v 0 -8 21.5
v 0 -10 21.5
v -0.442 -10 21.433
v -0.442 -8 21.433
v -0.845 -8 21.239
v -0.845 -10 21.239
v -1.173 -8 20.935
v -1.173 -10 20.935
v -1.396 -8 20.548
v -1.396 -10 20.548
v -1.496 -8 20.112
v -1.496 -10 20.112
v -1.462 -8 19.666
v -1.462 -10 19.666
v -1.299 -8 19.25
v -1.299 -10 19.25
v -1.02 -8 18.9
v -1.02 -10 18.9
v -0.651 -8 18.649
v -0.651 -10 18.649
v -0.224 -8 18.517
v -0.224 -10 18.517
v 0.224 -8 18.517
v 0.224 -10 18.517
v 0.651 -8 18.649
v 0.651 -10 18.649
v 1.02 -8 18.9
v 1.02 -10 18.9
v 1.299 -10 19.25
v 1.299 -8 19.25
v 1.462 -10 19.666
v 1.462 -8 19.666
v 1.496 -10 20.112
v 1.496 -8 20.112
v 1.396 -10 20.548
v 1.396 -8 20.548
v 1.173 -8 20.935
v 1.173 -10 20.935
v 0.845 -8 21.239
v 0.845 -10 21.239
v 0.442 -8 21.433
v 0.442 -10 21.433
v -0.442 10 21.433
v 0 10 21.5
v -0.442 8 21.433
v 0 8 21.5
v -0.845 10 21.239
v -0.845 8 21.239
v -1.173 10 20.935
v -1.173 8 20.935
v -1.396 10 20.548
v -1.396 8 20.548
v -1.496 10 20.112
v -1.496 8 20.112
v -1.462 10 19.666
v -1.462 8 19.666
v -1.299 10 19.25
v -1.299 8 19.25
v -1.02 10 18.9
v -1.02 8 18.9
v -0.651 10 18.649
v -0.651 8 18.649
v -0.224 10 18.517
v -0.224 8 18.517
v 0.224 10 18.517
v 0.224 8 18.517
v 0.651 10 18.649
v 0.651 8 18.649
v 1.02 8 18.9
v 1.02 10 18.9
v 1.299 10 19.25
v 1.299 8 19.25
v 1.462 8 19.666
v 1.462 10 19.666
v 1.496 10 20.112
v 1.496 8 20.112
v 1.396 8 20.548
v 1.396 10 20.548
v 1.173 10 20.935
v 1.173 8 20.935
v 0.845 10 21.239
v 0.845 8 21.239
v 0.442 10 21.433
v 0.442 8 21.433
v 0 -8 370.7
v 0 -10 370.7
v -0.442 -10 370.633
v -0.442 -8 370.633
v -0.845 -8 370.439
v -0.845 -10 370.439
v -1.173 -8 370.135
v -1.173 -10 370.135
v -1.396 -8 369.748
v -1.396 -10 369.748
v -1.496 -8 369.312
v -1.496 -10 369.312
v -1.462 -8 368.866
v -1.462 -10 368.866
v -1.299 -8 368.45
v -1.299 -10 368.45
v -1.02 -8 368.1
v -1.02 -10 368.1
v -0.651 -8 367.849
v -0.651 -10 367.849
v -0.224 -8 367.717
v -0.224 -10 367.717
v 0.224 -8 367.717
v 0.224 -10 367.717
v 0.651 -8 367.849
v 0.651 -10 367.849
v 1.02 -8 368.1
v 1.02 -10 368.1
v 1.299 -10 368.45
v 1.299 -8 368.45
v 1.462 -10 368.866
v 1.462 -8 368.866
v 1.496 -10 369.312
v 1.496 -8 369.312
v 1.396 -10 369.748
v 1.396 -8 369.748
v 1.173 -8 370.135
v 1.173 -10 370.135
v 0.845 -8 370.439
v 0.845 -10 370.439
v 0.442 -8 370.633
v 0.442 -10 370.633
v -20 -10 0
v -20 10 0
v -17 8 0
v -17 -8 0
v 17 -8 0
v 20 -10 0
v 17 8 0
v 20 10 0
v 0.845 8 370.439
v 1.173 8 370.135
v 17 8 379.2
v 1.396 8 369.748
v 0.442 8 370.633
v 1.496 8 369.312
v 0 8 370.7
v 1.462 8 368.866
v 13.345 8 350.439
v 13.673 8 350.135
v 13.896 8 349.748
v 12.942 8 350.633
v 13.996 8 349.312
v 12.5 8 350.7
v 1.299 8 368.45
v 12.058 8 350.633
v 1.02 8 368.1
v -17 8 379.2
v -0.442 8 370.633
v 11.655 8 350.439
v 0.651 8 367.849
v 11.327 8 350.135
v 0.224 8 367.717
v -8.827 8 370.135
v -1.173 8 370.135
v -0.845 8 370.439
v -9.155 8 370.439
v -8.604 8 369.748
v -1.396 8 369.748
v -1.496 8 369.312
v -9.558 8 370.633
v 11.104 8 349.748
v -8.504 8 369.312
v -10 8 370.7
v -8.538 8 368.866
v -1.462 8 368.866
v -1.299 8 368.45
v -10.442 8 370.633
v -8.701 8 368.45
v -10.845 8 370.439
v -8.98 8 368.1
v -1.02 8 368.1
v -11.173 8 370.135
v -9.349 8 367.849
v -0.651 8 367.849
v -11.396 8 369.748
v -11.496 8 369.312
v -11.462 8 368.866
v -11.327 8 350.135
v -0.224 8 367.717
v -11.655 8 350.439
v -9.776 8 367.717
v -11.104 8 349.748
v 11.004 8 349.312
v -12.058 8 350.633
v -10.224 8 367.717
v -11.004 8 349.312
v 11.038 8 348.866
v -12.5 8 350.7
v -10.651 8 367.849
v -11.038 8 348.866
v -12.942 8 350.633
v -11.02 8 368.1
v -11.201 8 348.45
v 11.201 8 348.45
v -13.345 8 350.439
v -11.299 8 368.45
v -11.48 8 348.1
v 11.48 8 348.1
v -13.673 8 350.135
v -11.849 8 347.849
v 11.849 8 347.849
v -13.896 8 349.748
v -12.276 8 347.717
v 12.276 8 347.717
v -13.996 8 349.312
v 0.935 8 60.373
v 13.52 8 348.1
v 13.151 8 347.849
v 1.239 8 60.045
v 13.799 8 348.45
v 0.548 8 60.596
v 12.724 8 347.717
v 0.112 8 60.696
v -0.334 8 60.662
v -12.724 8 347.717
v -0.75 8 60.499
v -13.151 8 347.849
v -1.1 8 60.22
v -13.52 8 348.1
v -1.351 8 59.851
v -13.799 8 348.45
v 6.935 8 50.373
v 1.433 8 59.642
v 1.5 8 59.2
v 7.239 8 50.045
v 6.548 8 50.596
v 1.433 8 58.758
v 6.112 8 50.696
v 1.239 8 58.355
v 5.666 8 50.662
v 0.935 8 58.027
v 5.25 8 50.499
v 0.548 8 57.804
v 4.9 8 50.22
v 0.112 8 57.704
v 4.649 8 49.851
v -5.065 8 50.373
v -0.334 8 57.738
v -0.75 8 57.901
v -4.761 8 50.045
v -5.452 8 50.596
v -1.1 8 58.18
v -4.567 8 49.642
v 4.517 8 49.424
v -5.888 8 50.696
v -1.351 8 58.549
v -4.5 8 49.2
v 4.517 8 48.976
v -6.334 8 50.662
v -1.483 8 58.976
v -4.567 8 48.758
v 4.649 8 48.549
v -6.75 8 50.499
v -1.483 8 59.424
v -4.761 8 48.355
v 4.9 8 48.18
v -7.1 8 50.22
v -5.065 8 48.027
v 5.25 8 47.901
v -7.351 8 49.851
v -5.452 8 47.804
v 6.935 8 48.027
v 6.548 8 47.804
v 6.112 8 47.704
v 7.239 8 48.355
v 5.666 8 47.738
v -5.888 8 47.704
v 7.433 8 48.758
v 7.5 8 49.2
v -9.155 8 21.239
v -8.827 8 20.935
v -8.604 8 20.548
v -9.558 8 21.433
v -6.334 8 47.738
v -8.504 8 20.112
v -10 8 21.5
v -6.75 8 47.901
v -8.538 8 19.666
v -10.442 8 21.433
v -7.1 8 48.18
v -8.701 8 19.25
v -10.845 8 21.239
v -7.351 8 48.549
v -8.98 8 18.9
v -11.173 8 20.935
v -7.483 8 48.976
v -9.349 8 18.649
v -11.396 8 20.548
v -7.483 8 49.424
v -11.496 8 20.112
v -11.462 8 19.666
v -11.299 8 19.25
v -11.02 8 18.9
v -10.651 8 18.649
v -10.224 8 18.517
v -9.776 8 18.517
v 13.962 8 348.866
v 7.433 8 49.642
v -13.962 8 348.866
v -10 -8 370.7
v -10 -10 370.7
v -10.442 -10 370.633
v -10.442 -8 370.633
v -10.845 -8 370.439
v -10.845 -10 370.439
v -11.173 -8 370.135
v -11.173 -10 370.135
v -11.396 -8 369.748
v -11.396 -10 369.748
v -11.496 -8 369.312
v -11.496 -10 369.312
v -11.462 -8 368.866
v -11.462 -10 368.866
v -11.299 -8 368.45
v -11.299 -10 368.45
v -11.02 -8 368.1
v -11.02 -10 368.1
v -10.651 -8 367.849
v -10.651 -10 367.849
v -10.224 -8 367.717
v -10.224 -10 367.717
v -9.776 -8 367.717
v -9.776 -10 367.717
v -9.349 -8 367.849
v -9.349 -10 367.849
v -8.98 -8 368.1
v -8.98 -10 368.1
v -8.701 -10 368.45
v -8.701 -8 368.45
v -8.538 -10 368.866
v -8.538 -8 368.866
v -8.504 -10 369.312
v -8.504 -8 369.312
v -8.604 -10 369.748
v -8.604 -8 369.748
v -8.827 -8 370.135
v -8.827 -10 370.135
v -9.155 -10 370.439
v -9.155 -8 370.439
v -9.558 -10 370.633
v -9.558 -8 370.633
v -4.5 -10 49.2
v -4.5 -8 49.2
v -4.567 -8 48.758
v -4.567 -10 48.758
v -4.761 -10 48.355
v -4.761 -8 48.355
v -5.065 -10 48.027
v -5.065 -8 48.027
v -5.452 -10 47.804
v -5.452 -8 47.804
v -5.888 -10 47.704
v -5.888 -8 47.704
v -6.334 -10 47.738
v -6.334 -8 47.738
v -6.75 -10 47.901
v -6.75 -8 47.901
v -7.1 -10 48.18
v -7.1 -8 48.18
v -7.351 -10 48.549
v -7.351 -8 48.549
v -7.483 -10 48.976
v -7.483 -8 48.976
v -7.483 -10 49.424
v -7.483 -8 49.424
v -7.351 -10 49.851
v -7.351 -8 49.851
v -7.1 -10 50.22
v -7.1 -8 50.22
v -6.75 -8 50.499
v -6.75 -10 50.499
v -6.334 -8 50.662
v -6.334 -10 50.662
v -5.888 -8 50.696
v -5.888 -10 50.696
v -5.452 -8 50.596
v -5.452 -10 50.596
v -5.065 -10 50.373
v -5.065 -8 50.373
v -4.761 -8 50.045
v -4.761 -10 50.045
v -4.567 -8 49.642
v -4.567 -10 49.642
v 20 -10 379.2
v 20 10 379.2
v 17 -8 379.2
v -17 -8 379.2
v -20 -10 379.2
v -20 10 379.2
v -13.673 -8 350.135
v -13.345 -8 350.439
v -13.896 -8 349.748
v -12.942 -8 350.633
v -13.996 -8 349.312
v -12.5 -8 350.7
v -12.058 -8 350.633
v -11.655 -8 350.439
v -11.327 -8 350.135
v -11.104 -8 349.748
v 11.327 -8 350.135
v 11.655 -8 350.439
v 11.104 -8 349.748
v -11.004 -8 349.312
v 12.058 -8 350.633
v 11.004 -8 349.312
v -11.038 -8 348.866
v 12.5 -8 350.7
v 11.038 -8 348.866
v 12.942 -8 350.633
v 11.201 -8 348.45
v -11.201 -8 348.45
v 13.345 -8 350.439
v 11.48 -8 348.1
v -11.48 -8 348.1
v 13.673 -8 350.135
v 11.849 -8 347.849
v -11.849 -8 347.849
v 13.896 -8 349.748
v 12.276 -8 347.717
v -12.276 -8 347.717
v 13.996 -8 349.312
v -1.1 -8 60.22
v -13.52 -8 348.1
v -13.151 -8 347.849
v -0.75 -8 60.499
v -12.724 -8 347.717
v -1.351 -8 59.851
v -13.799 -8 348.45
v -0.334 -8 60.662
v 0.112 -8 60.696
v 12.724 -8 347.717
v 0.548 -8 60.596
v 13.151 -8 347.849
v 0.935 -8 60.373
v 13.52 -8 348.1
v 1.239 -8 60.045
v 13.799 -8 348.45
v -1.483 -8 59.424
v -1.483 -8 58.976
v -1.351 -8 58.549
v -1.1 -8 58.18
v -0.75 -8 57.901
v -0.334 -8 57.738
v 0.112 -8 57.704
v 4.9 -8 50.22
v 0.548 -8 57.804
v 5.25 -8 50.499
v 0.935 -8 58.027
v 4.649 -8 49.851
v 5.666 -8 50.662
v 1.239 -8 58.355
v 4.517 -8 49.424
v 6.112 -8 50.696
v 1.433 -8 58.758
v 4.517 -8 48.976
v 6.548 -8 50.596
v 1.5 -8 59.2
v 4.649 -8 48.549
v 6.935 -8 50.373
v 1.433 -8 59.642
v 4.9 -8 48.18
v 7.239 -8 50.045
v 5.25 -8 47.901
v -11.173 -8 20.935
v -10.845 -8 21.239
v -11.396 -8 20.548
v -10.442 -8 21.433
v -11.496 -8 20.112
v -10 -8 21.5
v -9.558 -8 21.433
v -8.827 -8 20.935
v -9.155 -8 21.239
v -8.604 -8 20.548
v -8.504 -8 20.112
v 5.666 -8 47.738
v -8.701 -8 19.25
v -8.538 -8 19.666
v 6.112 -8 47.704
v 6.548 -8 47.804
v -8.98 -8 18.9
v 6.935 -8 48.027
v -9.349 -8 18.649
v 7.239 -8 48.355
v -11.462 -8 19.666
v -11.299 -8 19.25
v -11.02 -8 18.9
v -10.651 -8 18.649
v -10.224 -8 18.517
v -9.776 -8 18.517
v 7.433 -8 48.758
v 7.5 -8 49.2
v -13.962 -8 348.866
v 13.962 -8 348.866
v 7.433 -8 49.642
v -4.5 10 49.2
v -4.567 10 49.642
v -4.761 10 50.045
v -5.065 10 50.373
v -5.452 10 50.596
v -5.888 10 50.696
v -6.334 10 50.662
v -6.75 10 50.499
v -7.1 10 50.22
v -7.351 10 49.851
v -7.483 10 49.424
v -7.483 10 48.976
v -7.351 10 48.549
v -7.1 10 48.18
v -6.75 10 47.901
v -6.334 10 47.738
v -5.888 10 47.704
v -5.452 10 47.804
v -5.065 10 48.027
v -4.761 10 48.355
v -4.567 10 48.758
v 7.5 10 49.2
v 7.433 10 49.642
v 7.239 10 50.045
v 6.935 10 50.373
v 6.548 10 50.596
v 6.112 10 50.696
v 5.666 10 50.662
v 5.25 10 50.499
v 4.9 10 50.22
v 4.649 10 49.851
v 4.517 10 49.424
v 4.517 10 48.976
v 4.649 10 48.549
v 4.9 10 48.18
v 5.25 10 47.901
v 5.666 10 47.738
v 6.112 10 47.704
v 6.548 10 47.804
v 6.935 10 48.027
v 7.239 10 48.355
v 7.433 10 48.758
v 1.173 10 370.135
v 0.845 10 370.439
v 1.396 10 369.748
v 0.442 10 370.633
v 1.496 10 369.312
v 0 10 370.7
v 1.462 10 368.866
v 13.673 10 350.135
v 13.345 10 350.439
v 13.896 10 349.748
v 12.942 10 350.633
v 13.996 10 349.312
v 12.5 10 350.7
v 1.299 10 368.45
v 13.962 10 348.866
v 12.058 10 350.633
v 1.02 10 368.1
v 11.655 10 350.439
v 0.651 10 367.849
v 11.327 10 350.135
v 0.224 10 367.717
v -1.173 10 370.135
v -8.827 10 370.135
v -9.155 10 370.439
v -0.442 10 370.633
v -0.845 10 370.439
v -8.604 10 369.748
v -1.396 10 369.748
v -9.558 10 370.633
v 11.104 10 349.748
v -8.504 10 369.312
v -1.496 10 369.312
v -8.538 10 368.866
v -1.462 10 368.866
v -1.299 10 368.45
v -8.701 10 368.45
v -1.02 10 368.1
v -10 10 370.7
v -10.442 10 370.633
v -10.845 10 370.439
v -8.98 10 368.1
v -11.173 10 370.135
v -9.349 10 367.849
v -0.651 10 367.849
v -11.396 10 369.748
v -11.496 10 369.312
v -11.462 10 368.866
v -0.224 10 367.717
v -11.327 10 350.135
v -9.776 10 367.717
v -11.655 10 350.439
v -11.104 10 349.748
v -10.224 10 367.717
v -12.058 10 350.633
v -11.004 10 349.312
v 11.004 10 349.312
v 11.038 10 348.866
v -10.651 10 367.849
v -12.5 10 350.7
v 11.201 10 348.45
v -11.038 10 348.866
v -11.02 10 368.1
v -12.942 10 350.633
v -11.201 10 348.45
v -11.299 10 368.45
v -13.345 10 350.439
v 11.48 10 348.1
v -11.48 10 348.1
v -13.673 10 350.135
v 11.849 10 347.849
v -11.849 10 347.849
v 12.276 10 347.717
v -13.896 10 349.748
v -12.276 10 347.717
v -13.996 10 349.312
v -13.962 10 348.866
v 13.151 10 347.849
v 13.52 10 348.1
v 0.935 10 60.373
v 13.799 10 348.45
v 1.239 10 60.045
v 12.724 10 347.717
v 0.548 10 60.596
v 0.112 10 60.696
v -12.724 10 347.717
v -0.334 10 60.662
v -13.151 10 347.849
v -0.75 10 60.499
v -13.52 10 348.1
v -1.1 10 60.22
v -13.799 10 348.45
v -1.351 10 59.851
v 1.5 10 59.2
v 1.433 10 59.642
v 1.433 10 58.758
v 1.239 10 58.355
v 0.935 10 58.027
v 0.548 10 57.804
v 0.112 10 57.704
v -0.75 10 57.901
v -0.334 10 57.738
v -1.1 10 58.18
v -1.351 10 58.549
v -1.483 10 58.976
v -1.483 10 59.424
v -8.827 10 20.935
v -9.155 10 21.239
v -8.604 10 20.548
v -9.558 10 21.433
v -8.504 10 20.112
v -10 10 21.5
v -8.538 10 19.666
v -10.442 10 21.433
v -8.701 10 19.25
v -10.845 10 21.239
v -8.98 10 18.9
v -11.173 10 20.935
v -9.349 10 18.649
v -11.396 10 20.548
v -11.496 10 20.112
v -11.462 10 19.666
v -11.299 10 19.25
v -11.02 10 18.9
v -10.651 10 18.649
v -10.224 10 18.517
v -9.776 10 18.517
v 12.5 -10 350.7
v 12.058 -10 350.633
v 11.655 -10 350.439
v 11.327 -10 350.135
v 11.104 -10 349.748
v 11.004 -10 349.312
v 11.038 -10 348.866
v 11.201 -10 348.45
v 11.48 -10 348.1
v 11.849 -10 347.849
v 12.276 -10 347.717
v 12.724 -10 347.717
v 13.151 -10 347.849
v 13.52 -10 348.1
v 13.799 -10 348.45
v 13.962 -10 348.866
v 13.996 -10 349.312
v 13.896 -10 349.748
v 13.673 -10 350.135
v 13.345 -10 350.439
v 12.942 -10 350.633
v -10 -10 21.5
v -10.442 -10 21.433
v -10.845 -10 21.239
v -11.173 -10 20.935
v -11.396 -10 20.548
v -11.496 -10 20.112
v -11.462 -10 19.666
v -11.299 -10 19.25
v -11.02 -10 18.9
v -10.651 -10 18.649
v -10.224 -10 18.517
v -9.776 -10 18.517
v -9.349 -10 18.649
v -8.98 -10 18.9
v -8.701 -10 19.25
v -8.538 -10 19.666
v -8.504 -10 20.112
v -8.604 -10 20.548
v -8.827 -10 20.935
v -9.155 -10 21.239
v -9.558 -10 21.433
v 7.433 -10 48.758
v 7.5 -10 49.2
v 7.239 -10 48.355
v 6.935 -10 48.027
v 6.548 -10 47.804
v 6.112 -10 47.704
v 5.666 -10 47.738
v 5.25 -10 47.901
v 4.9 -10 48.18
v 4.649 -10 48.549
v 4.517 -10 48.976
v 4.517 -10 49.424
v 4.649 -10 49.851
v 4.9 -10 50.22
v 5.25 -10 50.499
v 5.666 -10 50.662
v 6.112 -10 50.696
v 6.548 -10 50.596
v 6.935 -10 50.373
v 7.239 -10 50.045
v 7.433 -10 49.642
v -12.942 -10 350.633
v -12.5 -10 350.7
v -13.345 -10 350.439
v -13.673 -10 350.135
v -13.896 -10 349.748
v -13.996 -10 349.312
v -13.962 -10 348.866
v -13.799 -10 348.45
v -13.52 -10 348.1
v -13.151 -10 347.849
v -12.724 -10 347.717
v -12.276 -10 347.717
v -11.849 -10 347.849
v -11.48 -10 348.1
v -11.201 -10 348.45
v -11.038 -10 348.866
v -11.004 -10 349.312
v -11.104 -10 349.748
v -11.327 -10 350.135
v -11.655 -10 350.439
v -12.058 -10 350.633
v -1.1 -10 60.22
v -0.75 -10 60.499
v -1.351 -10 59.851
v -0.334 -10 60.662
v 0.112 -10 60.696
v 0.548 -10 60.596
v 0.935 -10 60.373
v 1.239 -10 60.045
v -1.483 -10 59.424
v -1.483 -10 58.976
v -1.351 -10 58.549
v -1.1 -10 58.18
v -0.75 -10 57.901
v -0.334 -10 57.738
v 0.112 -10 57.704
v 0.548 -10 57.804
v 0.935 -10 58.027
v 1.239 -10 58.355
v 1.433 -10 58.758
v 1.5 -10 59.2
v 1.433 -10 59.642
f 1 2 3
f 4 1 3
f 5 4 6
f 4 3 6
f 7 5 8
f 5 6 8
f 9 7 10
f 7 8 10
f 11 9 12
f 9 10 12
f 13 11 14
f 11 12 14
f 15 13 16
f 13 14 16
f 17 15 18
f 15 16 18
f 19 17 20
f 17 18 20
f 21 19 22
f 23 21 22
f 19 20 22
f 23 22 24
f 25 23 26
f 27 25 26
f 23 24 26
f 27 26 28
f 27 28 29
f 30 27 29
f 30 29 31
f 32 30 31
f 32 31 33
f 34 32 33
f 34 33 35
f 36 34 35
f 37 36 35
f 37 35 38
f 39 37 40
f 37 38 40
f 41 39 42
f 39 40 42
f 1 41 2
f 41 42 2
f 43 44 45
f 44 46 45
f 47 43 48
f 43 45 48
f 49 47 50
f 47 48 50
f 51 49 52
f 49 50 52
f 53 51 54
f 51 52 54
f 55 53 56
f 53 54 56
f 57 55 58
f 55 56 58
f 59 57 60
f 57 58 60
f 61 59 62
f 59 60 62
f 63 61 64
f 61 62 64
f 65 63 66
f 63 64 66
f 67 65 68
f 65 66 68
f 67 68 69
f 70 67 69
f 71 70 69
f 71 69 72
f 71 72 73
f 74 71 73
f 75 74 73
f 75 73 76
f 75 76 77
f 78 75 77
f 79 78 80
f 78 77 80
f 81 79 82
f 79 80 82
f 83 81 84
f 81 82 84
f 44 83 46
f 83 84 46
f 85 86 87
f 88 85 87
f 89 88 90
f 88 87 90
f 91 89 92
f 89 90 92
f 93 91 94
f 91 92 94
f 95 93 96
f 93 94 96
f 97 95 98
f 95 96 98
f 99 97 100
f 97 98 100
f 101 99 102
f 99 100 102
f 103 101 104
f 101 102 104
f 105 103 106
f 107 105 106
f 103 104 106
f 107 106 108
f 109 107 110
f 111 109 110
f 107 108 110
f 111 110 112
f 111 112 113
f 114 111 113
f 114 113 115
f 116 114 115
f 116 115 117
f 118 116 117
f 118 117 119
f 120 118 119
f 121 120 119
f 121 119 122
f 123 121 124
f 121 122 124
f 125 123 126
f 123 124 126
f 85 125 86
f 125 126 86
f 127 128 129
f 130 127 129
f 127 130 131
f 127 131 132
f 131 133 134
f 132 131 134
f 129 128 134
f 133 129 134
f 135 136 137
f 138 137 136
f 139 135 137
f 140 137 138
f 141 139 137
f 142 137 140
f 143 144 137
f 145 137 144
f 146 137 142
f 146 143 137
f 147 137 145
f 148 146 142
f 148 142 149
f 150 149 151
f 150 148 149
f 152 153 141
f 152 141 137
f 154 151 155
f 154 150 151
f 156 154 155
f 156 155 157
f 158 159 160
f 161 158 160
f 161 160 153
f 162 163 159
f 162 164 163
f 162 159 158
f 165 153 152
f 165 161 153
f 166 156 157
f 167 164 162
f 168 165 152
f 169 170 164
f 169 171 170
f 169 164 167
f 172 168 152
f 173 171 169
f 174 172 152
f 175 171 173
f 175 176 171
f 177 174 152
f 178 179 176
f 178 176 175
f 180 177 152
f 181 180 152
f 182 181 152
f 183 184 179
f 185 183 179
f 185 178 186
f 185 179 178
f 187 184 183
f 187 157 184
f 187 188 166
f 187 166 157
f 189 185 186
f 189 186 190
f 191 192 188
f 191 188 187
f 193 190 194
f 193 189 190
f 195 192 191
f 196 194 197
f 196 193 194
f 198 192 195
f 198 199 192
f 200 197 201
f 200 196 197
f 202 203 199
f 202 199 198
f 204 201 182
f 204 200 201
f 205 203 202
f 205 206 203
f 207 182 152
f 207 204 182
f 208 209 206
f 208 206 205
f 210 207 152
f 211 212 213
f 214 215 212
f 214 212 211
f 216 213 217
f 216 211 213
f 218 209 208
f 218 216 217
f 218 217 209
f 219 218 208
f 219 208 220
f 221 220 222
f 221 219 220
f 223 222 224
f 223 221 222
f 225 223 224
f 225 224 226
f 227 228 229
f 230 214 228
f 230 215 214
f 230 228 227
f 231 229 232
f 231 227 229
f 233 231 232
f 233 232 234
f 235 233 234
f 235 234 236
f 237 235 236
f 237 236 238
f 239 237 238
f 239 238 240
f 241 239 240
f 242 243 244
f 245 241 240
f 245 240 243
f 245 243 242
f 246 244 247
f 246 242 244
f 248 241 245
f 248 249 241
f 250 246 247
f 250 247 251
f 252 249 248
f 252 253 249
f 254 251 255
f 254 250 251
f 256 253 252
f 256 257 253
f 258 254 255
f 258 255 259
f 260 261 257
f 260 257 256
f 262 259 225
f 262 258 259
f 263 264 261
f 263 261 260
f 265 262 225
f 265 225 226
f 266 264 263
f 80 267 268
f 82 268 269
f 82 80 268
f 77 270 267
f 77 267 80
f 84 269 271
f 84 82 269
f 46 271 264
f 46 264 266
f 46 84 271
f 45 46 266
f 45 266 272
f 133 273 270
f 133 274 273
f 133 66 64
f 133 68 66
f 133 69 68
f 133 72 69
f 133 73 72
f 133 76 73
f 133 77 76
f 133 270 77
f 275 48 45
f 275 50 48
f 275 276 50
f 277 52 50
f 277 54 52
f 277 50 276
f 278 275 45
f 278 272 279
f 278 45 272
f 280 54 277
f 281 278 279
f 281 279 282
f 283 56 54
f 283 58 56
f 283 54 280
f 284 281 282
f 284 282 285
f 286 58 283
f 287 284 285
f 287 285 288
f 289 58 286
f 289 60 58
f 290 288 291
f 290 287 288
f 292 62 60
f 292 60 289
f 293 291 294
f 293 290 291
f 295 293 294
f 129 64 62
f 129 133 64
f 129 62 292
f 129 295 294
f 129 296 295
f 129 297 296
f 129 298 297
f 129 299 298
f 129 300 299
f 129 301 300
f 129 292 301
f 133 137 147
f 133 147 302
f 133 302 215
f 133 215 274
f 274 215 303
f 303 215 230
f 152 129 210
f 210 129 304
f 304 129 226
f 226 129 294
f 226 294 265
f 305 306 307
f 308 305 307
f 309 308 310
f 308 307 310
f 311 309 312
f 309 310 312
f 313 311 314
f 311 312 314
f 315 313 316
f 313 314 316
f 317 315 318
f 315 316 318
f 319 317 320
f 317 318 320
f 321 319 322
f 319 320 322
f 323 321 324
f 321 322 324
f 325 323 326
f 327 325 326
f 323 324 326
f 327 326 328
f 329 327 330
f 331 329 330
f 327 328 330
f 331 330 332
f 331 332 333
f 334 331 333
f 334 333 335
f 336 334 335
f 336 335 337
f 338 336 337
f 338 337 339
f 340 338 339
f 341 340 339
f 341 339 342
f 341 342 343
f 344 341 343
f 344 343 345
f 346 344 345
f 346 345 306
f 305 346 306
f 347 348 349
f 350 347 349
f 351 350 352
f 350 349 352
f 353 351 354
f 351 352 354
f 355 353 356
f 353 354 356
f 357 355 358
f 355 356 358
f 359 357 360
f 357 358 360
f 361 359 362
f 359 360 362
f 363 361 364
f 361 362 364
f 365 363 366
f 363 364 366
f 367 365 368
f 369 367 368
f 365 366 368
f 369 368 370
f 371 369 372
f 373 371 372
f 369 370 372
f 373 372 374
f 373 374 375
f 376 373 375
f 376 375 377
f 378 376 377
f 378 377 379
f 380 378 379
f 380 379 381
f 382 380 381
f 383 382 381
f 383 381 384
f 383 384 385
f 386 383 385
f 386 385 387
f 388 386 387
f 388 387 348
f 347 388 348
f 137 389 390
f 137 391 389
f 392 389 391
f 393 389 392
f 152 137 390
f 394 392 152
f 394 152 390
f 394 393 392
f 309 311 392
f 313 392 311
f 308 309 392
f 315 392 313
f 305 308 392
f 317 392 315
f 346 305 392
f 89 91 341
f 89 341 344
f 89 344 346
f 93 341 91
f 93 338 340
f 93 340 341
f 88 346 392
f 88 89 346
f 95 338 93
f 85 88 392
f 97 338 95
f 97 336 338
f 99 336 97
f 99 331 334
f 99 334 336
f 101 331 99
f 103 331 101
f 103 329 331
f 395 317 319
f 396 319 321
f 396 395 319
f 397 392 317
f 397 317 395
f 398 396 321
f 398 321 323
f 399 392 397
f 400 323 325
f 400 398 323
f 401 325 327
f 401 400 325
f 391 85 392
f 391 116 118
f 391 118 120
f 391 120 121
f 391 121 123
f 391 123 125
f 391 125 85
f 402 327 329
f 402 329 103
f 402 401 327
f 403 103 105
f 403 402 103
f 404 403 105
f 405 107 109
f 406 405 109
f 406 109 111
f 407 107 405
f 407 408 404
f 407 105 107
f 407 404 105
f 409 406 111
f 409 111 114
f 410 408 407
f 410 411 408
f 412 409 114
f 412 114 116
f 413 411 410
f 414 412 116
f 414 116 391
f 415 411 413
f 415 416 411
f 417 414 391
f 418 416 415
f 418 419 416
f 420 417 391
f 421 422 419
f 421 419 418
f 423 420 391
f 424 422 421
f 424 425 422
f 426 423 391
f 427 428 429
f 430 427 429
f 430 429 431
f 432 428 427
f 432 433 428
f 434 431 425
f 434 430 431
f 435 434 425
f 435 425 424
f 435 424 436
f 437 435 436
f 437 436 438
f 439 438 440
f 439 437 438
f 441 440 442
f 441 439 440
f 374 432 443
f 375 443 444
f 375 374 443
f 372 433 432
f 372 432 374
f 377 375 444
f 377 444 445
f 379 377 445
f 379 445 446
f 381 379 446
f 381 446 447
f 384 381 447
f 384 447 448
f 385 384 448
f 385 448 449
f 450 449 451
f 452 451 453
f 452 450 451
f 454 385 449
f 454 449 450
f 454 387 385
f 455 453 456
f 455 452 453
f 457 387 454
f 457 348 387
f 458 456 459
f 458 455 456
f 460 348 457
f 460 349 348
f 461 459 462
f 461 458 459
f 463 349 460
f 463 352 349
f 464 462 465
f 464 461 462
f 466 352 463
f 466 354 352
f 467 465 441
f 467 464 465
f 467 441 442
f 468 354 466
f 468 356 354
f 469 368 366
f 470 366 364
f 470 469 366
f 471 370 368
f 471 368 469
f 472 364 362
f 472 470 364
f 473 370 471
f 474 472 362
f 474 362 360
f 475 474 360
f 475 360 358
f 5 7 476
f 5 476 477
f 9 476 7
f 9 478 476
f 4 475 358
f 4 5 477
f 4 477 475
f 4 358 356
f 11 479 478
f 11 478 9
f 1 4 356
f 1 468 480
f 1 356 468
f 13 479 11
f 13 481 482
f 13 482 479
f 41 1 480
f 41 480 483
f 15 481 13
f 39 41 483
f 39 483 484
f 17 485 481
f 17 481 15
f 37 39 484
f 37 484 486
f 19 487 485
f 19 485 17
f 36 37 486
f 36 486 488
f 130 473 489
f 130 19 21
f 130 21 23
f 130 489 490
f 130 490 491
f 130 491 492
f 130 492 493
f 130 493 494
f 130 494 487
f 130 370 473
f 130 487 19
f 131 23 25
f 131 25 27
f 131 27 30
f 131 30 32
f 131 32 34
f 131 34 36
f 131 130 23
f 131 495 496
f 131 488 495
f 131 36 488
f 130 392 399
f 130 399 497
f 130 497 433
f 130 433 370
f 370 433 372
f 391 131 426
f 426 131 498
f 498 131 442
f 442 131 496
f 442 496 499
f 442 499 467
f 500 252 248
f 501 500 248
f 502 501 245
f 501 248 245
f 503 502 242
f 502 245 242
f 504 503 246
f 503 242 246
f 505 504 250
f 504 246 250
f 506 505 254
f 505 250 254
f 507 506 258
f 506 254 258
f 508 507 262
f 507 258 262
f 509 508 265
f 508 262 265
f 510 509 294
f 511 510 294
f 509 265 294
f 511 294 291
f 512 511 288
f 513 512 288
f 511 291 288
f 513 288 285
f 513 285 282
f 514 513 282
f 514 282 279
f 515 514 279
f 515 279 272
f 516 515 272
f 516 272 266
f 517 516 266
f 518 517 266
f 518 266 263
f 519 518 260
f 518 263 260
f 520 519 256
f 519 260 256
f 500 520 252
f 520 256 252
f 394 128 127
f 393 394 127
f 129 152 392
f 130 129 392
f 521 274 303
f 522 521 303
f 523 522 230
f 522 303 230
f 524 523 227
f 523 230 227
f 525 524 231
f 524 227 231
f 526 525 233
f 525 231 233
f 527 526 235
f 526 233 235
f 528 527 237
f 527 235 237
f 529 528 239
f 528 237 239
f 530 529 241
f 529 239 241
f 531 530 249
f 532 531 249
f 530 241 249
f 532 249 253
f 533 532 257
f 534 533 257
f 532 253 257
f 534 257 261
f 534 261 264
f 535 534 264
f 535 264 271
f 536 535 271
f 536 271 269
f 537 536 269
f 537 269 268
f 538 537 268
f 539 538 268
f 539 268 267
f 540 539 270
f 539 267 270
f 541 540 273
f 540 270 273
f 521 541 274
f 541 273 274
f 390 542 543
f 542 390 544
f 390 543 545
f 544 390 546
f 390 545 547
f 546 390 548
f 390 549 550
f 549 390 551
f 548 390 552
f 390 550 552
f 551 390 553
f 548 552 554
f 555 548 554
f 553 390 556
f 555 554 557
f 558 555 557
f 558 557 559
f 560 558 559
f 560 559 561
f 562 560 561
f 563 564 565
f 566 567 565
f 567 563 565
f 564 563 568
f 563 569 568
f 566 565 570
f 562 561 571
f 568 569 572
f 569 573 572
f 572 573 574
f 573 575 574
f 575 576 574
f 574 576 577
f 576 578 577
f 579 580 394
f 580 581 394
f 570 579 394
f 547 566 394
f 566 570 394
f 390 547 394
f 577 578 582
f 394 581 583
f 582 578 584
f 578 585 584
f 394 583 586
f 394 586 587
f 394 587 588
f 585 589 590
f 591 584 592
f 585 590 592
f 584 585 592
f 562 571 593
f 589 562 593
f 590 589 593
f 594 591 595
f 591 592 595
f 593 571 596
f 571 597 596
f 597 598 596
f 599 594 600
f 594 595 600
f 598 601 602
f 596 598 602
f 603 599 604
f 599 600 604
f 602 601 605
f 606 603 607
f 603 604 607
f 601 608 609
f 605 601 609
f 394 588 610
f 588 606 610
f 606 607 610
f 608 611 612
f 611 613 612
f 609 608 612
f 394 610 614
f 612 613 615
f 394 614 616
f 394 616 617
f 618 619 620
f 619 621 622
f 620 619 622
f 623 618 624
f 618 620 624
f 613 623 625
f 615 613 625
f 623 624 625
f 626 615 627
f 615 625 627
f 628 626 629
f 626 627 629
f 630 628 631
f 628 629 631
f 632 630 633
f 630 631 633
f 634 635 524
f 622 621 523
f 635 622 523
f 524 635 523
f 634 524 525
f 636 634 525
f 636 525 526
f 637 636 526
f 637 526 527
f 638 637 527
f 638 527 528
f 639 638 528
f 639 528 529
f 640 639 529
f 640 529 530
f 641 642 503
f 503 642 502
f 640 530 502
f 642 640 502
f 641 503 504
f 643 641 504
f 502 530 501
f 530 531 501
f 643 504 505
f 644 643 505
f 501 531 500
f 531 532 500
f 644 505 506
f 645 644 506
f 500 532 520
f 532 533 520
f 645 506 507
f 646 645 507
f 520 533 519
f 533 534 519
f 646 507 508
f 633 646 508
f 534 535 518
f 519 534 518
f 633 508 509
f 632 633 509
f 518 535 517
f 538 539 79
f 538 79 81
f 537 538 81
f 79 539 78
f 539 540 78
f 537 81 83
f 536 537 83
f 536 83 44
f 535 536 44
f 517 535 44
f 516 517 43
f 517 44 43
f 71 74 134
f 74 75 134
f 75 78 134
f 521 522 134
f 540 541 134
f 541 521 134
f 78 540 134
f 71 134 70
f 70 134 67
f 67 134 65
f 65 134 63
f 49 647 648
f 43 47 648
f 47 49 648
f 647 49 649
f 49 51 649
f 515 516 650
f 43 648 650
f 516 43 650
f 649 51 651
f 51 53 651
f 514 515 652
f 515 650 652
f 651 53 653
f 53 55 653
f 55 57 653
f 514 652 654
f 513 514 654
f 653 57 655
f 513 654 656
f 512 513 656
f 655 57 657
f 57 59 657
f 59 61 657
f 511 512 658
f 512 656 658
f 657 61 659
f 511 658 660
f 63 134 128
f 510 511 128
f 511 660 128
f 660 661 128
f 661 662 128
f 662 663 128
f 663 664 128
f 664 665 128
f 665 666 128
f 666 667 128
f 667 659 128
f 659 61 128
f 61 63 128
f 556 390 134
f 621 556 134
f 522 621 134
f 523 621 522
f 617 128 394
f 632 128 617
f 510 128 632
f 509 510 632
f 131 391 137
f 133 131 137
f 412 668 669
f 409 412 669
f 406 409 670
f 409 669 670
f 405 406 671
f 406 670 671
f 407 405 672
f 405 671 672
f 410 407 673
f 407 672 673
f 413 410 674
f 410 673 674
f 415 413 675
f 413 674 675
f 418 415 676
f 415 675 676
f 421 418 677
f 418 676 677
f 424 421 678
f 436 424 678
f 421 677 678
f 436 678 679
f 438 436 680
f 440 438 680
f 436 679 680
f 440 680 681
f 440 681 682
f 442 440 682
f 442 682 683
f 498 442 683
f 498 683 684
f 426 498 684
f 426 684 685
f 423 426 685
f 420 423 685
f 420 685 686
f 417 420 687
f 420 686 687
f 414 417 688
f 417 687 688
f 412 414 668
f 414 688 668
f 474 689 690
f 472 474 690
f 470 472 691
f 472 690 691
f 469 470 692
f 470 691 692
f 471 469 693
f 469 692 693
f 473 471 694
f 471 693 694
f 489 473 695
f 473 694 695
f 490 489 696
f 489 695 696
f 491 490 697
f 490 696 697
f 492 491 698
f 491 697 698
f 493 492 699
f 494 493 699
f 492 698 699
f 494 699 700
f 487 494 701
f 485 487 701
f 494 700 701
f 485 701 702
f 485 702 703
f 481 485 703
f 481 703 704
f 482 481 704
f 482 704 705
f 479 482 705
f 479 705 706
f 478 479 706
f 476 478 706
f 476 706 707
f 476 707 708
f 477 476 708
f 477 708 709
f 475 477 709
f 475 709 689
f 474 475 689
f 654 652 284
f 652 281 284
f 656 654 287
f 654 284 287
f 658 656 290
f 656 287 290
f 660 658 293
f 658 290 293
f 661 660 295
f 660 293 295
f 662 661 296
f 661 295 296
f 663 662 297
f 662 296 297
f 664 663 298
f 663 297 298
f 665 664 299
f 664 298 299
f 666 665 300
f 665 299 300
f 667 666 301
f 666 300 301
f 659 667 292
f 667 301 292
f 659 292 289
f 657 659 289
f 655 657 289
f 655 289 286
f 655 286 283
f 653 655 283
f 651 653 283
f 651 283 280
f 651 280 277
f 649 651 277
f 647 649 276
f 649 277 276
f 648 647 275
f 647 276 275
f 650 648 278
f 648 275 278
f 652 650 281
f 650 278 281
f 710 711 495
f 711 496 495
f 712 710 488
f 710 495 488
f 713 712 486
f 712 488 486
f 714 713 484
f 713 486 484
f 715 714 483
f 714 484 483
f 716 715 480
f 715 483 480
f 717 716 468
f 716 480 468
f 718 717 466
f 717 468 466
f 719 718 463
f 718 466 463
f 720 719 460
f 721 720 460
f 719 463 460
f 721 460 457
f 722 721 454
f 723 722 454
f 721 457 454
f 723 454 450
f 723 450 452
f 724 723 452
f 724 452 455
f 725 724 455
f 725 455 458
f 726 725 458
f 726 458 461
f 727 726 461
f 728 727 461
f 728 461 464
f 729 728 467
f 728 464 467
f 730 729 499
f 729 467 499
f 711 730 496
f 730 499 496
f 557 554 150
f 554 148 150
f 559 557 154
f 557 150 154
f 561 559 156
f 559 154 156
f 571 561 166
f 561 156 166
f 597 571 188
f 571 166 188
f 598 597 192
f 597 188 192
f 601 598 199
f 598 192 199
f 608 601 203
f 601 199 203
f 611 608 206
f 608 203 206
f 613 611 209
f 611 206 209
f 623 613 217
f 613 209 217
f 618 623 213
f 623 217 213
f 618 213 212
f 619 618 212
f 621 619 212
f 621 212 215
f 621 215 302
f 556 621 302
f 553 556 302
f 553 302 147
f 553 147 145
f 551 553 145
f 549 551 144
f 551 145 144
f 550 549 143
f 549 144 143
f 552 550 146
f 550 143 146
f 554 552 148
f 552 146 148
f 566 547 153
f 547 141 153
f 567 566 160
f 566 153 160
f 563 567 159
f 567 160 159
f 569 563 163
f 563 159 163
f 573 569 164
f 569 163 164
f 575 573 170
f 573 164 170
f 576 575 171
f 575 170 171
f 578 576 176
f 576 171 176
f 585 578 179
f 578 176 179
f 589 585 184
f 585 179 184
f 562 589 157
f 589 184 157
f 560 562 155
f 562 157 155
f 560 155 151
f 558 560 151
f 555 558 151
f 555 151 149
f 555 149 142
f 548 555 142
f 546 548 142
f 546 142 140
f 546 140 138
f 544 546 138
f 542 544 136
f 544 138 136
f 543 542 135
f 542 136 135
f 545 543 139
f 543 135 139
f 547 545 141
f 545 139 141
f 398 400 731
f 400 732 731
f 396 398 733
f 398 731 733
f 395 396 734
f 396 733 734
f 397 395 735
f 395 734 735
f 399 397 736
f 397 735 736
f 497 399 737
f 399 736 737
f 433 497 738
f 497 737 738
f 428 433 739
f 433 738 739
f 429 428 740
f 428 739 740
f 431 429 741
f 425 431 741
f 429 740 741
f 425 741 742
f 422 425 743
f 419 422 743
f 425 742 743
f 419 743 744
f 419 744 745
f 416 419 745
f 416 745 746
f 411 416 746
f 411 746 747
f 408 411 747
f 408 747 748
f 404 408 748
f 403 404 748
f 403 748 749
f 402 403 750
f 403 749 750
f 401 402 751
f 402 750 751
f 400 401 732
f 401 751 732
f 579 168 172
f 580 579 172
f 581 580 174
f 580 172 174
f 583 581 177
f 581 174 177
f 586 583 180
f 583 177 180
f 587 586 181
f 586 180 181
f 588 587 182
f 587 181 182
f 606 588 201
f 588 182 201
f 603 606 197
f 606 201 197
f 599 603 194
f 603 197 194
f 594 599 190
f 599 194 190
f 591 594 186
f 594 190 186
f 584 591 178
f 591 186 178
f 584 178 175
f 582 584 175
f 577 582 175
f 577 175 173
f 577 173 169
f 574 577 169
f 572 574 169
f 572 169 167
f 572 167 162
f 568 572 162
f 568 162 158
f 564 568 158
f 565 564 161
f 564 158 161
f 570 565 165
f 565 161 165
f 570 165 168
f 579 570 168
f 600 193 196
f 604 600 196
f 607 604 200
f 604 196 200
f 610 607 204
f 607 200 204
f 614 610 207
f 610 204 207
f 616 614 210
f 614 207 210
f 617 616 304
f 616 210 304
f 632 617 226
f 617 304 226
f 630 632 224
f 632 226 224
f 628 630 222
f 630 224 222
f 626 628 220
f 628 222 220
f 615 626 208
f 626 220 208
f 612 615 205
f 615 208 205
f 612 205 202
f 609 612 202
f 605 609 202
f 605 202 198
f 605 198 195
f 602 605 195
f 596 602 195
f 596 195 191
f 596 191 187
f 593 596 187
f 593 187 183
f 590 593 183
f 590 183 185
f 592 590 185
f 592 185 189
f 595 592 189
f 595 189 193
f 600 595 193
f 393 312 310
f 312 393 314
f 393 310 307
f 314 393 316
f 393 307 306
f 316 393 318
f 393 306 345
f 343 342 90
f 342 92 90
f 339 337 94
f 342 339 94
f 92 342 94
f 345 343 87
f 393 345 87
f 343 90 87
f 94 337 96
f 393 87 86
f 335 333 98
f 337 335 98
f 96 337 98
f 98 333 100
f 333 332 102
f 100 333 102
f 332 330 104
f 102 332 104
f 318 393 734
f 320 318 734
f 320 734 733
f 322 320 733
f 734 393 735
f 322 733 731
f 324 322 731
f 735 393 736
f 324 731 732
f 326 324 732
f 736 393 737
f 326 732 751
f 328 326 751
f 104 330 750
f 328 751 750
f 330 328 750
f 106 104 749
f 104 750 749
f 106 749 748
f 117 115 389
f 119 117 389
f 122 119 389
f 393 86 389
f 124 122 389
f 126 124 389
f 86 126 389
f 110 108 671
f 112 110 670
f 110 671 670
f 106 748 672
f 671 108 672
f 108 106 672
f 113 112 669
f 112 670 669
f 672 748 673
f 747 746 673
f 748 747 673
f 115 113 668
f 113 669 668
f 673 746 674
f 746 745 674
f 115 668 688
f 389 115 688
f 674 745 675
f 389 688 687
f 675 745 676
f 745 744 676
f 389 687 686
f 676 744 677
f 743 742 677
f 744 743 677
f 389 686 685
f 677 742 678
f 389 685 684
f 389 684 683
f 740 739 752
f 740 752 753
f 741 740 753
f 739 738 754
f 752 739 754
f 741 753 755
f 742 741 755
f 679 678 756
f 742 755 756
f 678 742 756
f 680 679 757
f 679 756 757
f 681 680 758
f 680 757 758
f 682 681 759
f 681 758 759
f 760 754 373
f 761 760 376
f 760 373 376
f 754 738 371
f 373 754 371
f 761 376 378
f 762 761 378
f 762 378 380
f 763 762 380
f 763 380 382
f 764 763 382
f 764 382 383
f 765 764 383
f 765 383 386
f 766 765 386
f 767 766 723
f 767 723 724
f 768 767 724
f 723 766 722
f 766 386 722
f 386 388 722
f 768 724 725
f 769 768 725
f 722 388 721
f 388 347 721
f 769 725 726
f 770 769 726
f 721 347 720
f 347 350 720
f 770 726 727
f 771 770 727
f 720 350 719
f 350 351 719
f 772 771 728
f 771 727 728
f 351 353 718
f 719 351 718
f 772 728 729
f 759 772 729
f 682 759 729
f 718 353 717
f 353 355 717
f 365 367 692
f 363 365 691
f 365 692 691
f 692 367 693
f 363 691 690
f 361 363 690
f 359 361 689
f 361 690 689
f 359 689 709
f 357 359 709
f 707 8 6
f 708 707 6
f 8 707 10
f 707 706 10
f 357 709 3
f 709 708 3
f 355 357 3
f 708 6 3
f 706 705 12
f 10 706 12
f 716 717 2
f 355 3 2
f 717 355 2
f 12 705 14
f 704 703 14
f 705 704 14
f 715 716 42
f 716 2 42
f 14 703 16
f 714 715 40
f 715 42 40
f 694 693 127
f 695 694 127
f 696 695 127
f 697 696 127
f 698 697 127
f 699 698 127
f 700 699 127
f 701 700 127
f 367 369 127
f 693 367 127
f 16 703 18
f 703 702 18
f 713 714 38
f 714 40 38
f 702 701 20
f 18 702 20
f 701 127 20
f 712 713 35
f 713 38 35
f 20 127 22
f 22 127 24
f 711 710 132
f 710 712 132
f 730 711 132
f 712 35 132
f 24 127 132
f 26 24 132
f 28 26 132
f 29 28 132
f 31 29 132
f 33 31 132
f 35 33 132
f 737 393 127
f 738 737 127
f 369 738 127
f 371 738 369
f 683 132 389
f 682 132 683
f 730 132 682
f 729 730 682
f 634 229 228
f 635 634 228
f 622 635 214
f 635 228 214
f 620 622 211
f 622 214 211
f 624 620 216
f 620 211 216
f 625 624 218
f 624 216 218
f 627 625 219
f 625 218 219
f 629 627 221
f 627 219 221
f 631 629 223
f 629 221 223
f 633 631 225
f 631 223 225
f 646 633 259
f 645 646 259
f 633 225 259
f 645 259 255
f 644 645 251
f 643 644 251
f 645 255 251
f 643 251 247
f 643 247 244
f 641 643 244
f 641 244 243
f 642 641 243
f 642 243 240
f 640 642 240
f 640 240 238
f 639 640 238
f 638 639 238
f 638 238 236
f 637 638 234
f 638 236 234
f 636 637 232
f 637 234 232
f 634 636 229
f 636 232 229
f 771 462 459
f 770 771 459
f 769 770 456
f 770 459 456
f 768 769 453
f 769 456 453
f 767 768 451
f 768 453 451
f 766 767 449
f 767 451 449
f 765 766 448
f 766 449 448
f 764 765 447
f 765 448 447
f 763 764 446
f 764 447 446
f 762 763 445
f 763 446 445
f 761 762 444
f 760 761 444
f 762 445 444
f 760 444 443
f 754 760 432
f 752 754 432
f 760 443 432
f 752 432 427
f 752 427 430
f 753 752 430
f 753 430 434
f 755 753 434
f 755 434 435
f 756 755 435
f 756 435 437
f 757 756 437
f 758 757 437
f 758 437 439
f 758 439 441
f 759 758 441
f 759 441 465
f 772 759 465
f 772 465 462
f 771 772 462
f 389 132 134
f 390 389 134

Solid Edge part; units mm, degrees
sketch "Sketch1" plane through (0, 0, 0) normal (0, 0, 1) x (1, 0, 0)
  line L0 (-17, -8) -> (17, -8)
  line L1 (17, -8) -> (17, 8)
  line L2 (17, 8) -> (-17, 8)
  line L3 (-17, 8) -> (-17, -8)
  line L4 (-20, -10) -> (20, -10)
  line L5 (20, -10) -> (20, 10)
  line L6 (20, 10) -> (-20, 10)
  line L7 (-20, 10) -> (-20, -10)
  dimension "D1" = 40
  dimension "D2" = 20
  dimension "D3" = 20
  dimension "D4" = 10
  dimension "D5" = 10
  dimension "D6" = 34
  dimension "D7" = 17
  dimension "D8" = 16
  dimension "D9" = 8
extrude "Protrusion1" add sketch "Sketch1" along normal blind 500
sketch "Sketch2" plane through (0, 0, 0) normal (0, -1, 0) x (1, 0, 0)
  circle A0 centre (-6, 49.2) radius 1.5
  circle A1 centre (6, 49.2) radius 1.5
  circle A2 centre (0, 59.2) radius 1.5
  dimension "D1" = 59.2
  dimension "D2" = 6
  dimension "D3" = 6
  dimension "D4" = 10
extrude "ExtrudedCutout_1" cut sketch "Sketch2" along normal mid plane 184.7179
sketch "Sketch3" plane through (0, -10, 250) normal (0, -1, 0) x (0, 0, 1)
  circle A0 centre (-230, 10) radius 1.5
  circle A1 centre (-230, 0) radius 1.5
  dimension "D1" = 20
  dimension "D2" = 10
  dimension "D3" = 10
extrude "VaciadoExtruido_2" cut sketch "Sketch3" against normal blind 109.5957
sketch "Sketch4" plane through (0, -10, 250) normal (0, -1, 0) x (0, 0, 1)
  circle A0 centre (99.2, 12.5) radius 1.5
  circle A1 centre (99.2, -12.5) radius 1.5
  dimension "D1" = 349.2
  dimension "D2" = 3
  dimension "D3" = 25
extrude "VaciadoExtruido_3" cut sketch "Sketch4" along normal mid plane 772.9551
sketch "Sketch5" plane through (20, 0, 250) normal (1, 0, 0) x (0, 0, 1)
  line L0 (129.2, 28.1693) -> (129.2, -48.5485)
  line L1 (267.5229, -23.3945) -> (129.2, -48.5485)
  line L2 (267.5229, 33.3028) -> (267.5229, -23.3945)
  line L3 (129.2, 28.1693) -> (267.5229, 33.3028)
  dimension "D1" = 379.2
extrude "VaciadoExtruido_4" cut sketch "Sketch5" along normal mid plane 530
sketch "Sketch6" plane through (0, -10, 189.6) normal (0, -1, 0) x (0, 0, 1)
  circle A0 centre (179.6, 10) radius 1.5
  circle A1 centre (179.6, 0) radius 1.5
  dimension "D1" = 10
  dimension "D2" = 10
  dimension "D3" = 10
extrude "VaciadoExtruido_5" cut sketch "Sketch6" along normal mid plane 1696
